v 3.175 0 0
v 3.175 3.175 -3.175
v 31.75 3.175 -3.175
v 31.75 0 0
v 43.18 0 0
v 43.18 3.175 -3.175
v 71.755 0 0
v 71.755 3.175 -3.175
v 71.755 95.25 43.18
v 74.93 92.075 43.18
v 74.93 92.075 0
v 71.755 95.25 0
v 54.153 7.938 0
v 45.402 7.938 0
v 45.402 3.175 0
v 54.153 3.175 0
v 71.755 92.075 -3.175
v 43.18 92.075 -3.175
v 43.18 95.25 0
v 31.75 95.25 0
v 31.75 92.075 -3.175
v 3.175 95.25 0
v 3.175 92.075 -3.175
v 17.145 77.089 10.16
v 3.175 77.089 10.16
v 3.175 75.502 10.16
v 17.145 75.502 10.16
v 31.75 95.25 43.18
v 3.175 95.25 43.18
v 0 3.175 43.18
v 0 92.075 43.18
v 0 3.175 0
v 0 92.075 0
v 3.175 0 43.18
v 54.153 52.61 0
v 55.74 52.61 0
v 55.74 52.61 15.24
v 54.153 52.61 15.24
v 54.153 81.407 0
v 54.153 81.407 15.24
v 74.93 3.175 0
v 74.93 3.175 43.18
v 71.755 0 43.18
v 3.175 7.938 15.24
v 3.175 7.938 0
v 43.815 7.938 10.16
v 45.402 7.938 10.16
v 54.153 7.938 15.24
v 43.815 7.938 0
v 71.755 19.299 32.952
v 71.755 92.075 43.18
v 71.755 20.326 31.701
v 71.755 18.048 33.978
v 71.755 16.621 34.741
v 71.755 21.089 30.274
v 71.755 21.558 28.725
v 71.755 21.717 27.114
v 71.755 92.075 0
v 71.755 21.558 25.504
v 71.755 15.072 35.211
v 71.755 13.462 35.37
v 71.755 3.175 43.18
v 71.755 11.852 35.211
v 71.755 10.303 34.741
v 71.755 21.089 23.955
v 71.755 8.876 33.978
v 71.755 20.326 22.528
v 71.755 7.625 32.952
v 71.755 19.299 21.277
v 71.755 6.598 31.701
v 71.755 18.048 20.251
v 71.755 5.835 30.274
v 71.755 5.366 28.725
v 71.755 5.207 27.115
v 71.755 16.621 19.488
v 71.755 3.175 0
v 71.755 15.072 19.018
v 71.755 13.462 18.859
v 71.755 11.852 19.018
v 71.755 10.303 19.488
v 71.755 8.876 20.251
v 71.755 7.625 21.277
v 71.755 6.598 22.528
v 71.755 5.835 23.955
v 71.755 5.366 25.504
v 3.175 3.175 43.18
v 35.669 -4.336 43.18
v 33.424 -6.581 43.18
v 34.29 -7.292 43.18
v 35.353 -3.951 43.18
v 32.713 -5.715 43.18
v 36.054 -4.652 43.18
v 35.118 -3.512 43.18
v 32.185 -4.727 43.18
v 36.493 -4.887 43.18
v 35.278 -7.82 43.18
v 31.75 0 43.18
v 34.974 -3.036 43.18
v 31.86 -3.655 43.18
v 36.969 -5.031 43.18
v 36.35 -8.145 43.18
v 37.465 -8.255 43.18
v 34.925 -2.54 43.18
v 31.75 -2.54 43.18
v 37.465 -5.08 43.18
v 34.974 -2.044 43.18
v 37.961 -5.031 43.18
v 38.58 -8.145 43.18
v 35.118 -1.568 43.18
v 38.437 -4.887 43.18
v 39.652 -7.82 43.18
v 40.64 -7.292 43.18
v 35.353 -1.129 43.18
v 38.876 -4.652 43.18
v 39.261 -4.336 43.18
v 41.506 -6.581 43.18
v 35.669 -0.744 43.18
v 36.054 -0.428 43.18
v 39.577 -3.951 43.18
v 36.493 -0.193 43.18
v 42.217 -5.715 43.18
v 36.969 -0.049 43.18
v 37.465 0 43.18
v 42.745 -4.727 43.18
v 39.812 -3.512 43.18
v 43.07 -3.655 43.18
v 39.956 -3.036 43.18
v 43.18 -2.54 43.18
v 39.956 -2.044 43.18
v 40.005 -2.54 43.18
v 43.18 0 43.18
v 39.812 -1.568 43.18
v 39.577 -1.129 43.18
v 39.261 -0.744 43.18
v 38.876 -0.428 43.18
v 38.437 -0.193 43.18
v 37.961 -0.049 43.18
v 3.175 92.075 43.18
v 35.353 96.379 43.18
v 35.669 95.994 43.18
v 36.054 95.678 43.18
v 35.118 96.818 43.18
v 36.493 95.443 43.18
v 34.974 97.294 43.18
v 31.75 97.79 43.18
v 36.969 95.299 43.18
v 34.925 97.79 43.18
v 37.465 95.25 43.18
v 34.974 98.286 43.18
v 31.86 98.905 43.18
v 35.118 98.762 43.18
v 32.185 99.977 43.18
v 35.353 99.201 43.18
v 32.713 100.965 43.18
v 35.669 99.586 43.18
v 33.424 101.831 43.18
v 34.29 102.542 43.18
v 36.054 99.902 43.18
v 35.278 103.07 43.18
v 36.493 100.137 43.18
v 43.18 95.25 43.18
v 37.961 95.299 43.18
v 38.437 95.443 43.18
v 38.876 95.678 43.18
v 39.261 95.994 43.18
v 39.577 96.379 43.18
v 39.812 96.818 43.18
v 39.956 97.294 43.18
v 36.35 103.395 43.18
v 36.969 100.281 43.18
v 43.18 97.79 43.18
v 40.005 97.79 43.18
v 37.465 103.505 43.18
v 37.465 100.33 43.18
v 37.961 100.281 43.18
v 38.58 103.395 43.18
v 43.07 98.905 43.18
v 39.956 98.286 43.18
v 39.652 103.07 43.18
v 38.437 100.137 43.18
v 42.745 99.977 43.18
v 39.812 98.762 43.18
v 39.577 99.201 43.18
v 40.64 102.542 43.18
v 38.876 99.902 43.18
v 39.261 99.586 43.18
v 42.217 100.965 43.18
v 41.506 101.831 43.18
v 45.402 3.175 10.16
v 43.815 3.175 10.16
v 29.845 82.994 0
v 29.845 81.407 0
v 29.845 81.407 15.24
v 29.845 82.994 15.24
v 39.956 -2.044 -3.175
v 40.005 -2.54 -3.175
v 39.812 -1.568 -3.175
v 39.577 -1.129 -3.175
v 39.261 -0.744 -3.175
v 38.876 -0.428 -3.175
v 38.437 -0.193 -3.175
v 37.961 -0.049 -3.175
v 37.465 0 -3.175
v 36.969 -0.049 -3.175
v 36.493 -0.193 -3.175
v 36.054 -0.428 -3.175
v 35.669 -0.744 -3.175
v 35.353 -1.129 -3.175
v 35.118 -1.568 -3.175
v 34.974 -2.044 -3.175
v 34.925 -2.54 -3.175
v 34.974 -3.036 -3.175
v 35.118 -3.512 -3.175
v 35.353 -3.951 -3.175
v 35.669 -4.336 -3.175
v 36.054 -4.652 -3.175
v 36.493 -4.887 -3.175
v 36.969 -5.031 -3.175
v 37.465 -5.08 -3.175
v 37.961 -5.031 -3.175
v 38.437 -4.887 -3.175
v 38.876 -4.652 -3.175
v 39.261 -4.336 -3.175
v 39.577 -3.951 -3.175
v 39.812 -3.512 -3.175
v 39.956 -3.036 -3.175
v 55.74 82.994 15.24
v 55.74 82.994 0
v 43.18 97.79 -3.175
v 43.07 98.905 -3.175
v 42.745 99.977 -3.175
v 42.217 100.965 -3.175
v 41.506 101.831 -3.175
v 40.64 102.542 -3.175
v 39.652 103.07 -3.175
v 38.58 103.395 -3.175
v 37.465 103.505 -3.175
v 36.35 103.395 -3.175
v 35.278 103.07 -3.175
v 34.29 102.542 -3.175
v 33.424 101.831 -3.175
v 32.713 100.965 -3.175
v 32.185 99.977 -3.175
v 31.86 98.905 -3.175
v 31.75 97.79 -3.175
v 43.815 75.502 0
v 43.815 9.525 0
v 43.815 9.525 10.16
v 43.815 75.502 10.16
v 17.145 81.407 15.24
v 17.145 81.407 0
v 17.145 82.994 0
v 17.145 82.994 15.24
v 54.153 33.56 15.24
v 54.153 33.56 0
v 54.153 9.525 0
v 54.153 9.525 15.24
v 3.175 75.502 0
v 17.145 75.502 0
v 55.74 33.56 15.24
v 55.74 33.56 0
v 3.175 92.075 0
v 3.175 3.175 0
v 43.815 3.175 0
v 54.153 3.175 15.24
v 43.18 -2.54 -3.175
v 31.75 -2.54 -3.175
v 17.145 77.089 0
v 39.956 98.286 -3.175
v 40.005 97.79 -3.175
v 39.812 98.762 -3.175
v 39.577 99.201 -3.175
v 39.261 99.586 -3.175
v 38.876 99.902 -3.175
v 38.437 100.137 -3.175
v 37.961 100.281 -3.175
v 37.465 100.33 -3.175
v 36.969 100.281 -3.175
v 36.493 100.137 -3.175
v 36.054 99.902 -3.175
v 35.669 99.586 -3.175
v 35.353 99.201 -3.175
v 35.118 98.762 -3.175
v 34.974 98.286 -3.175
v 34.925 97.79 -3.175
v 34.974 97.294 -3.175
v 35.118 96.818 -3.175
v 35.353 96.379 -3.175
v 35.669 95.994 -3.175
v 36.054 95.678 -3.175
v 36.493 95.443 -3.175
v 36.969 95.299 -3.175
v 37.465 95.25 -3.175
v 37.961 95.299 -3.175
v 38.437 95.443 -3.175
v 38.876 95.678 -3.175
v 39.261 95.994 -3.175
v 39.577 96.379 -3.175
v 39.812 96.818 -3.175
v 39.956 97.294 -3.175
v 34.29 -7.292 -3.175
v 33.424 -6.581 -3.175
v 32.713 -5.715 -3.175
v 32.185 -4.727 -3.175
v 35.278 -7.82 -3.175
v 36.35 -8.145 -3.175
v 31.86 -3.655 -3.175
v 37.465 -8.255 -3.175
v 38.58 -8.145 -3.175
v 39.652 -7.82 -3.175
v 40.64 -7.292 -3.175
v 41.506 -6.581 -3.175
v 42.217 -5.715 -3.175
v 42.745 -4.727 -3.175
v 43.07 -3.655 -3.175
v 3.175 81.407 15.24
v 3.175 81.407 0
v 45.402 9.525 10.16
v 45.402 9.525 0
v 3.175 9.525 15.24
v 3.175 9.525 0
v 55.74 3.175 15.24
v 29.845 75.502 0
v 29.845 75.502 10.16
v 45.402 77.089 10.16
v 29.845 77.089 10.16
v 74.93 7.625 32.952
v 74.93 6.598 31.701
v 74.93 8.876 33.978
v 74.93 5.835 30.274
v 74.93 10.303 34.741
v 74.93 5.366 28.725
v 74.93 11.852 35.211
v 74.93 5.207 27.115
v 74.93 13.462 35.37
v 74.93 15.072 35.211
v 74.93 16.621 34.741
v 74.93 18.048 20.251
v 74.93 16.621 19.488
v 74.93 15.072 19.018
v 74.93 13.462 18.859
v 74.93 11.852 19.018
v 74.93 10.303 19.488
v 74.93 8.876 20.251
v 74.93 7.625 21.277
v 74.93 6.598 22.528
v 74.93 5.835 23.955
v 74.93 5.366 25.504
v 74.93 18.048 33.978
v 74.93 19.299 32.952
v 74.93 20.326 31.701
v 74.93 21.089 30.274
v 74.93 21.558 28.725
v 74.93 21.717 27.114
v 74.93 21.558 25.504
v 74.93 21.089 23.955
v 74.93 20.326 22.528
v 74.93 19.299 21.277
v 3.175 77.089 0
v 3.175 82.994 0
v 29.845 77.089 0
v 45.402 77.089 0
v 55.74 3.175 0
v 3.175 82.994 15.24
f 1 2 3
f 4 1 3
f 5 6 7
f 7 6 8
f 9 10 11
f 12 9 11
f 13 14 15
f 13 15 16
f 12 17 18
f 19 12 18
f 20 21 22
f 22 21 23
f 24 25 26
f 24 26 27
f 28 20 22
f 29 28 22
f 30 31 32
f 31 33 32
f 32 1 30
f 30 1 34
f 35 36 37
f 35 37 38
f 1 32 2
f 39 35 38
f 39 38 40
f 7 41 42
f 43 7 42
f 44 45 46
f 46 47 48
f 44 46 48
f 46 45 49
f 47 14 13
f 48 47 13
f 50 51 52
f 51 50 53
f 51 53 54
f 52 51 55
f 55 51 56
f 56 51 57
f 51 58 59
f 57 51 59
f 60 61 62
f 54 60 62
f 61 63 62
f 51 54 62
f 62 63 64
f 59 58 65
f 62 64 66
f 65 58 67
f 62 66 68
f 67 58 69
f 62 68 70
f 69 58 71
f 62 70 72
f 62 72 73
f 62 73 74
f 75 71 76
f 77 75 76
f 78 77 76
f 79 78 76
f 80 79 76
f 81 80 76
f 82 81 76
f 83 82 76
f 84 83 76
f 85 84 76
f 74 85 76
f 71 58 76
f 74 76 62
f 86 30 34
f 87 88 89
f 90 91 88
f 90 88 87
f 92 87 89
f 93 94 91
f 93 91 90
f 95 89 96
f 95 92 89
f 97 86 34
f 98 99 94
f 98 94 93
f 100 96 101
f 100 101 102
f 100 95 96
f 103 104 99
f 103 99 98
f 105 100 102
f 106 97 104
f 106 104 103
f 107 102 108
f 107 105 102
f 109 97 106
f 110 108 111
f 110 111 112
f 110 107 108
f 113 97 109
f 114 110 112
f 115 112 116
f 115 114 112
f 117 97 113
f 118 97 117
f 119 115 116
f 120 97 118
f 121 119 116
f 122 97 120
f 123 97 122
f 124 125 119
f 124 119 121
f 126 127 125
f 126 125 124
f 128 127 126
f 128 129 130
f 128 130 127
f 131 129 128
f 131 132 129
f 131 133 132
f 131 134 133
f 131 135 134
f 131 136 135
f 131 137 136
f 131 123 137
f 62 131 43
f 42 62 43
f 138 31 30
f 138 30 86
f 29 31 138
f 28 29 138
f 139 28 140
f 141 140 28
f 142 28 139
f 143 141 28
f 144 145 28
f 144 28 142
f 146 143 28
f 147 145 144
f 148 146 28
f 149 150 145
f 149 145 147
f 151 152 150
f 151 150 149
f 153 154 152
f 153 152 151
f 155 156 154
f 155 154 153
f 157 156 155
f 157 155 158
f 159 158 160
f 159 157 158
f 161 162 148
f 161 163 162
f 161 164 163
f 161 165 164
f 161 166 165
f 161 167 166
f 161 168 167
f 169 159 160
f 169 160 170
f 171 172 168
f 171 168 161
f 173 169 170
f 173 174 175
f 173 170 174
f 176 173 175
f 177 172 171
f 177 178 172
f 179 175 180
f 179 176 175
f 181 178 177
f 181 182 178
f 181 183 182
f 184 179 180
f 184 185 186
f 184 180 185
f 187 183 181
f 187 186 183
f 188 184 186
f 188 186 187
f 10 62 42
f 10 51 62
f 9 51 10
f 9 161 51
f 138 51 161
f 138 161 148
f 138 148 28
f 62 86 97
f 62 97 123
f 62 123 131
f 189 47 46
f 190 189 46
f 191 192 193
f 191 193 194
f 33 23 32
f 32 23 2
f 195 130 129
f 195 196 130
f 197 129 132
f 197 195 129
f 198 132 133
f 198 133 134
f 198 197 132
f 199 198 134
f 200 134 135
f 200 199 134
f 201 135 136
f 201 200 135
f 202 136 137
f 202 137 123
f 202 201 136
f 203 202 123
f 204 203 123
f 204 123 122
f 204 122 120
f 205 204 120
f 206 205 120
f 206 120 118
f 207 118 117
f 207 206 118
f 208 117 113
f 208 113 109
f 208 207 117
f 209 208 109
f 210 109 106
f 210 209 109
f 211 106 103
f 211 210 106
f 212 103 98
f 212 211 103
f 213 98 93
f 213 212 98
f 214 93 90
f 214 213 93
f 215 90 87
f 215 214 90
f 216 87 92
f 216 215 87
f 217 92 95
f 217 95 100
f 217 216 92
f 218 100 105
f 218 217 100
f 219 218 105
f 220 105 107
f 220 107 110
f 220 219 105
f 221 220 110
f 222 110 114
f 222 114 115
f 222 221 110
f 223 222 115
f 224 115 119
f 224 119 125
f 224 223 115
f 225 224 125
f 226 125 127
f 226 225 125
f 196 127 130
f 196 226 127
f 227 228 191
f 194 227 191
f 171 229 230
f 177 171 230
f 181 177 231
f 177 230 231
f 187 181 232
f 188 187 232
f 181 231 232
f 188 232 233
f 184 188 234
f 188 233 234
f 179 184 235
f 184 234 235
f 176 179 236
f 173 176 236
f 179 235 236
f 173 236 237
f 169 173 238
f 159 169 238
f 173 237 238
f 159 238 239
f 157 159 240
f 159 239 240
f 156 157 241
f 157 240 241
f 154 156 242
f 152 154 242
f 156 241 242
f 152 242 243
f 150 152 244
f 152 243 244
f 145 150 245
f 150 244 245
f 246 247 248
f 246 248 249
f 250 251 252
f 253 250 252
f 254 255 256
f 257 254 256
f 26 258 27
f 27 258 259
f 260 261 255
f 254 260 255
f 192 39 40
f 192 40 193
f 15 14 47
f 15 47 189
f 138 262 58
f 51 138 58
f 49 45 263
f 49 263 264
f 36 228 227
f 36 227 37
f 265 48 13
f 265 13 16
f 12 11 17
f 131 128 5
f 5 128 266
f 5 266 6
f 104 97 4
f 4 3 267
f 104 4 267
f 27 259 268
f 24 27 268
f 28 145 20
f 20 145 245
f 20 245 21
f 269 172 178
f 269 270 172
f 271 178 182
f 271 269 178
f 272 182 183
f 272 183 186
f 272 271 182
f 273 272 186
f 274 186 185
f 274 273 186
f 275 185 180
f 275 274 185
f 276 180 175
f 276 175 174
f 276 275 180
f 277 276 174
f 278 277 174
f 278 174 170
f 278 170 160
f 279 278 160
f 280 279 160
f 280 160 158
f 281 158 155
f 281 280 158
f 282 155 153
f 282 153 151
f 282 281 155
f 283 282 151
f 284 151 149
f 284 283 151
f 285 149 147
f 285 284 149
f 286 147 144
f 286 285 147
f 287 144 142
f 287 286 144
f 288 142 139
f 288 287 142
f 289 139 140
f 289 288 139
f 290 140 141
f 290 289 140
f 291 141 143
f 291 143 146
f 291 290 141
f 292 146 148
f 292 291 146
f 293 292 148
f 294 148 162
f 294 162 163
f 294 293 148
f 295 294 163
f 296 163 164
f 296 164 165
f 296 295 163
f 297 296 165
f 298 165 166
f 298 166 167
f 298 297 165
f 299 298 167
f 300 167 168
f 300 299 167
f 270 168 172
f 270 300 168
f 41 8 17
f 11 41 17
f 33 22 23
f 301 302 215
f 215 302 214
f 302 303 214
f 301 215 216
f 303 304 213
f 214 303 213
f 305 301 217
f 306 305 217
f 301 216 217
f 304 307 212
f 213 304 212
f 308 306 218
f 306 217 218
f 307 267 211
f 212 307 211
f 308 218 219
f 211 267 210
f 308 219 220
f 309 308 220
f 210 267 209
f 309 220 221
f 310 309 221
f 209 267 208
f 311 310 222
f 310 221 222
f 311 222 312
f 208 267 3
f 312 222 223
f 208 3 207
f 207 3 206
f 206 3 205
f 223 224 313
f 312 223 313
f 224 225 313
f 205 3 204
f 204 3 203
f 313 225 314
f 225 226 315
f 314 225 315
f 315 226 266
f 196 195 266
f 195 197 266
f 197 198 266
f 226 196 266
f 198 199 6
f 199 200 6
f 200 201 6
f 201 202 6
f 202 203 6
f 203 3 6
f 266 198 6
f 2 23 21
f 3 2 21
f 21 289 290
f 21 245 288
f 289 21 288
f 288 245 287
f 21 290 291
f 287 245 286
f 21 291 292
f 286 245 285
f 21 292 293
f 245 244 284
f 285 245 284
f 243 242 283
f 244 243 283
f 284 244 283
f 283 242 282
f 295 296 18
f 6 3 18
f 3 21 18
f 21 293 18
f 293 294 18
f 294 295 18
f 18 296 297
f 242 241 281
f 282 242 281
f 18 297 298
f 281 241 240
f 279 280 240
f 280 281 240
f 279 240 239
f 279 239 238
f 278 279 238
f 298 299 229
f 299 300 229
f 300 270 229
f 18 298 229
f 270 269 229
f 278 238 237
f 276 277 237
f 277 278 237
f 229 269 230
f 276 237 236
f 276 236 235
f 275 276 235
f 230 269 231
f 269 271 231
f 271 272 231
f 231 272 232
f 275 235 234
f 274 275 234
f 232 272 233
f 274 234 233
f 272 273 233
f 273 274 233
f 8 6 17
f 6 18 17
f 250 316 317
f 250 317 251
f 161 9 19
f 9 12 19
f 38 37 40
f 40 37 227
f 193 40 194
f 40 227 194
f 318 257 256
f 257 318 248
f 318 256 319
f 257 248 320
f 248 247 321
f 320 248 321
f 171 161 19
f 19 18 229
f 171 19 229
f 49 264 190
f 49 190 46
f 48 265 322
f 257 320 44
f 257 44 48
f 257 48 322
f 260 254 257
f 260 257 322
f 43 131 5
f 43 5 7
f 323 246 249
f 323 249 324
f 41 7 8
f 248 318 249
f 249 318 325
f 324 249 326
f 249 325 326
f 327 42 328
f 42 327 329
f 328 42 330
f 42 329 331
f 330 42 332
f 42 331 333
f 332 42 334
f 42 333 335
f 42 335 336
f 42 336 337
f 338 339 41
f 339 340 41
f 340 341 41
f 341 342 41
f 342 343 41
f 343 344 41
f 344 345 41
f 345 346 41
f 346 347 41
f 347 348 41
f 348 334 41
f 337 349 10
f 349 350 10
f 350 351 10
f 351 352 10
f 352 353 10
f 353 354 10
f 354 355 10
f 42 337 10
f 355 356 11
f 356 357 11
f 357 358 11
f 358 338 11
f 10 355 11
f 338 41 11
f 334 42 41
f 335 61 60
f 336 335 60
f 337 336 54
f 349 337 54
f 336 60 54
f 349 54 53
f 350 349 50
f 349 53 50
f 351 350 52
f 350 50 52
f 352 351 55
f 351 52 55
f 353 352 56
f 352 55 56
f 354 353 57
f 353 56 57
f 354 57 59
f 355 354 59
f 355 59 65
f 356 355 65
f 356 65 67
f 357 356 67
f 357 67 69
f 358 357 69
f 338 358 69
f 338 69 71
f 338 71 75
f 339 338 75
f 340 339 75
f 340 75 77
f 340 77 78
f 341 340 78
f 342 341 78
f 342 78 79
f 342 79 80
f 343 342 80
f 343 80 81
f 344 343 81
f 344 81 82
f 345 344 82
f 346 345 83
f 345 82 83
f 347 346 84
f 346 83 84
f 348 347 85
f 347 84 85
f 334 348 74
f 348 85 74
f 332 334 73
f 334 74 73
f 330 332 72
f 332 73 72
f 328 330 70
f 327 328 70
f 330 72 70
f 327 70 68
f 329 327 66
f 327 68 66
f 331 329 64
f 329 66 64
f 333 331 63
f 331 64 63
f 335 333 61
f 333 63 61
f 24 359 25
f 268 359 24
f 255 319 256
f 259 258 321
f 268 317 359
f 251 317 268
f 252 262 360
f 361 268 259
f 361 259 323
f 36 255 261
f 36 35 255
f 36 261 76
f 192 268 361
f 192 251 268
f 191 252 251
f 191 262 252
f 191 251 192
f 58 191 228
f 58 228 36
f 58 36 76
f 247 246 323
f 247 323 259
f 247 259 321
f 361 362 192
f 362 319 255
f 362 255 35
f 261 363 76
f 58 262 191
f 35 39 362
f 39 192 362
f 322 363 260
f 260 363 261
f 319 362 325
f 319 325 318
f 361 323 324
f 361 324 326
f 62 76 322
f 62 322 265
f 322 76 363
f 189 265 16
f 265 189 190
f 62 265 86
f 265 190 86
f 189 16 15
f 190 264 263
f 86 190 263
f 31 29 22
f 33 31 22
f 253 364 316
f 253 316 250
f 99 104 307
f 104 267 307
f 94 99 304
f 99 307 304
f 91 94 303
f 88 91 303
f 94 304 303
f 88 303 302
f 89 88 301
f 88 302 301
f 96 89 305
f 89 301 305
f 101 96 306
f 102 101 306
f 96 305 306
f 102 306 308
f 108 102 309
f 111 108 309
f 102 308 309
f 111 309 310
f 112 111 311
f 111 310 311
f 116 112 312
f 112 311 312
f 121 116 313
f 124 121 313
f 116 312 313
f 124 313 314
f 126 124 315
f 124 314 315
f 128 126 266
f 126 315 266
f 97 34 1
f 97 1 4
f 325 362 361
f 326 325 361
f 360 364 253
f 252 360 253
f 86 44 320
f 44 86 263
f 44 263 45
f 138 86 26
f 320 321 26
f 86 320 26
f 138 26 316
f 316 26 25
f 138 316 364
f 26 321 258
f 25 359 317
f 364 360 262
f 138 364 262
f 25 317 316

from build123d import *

# Parameters (mm, degrees)
SKETCH1_R           = 2.54
BOSS_EXTRUDE1_DEPTH = 3.175
SKETCH1_3_W         = 13.97
SKETCH1_3_H         = 1.5875
BOSS_EXTRUDE2_DEPTH = 10.16
BOSS_EXTRUDE3_START = 43.18
SKETCH1_4_R         = 2.54
BOSS_EXTRUDE3_DEPTH = 43.18
SKETCH2_W           = 13.97
SKETCH2_H           = 1.5875
BOSS_EXTRUDE4_DEPTH = 15.24
SKETCH3_R           = 8.255
CUT_EXTRUDE1_DEPTH  = 15.24
CHAMFER1_SIZE       = 3.175


with BuildPart() as part:
    # Sketch1 → Boss-Extrude1 (new body)
    with BuildSketch(Plane.XY):
        with BuildLine():
            Line((0, 0), (31.75, 0))
            Line((31.75, 0), (31.75, -2.54))
            ThreePointArc((31.75, -2.54), (37.465, -8.255), (43.18, -2.54))
            Line((43.18, -2.54), (43.18, 0))
            Line((43.18, 0), (74.93, 0))
            Line((74.93, 0), (74.93, 95.25))
            Line((74.93, 95.25), (43.18, 95.25))
            Line((43.18, 95.25), (43.18, 97.79))
            ThreePointArc((43.18, 97.79), (37.465, 103.505), (31.75, 97.79))
            Line((31.75, 97.79), (31.75, 95.25))
            Line((31.75, 95.25), (0, 95.25))
            Line((0, 95.25), (0, 0))
        make_face()
        with Locations((37.465, -2.54)):
            Circle(SKETCH1_R, mode=Mode.SUBTRACT)
        with Locations((37.465, 97.79)):
            Circle(SKETCH1_R, mode=Mode.SUBTRACT)
    extrude(amount=-BOSS_EXTRUDE1_DEPTH)

    # Sketch1<3> → Boss-Extrude2 (add)
    with BuildSketch(Plane.XY):
        Polygon((43.815, 9.525), (43.815, 75.5015), (29.845, 75.5015), (29.845, 77.089), (43.815, 77.089), (45.4025, 77.089), (45.4025, 3.175), (43.815, 3.175), (43.815, 7.9375), (3.175, 7.9375), (3.175, 9.525), align=None)
        with Locations((10.16, 76.29525)):
            Rectangle(SKETCH1_3_W, SKETCH1_3_H)
    extrude(amount=BOSS_EXTRUDE2_DEPTH)

    # Sketch1<4> → Boss-Extrude3 (add)
    with BuildSketch(Plane.XY.offset(BOSS_EXTRUDE3_START)):
        with BuildLine():
            Line((0, 95.25), (0, 0))
            Line((0, 0), (31.75, 0))
            Line((31.75, 0), (31.75, -2.54))
            ThreePointArc((31.75, -2.54), (37.465, -8.255), (43.18, -2.54))
            Line((43.18, -2.54), (43.18, 0))
            Line((43.18, 0), (74.93, 0))
            Line((74.93, 0), (74.93, 95.25))
            Line((74.93, 95.25), (43.18, 95.25))
            Line((43.18, 95.25), (43.18, 97.79))
            ThreePointArc((43.18, 97.79), (37.465, 103.505), (31.75, 97.79))
            Line((31.75, 97.79), (31.75, 95.25))
            Line((31.75, 95.25), (0, 95.25))
        make_face()
        with Locations((37.465, -2.54)):
            Circle(SKETCH1_4_R, mode=Mode.SUBTRACT)
        Polygon((3.175, 7.9375), (3.175, 9.525), (3.175, 75.5015), (3.175, 77.089), (3.175, 92.075), (71.755, 92.075), (71.755, 3.175), (45.4025, 3.175), (43.815, 3.175), (3.175, 3.175), align=None, mode=Mode.SUBTRACT)
        with Locations((37.465, 97.79)):
            Circle(SKETCH1_4_R, mode=Mode.SUBTRACT)
    extrude(amount=-BOSS_EXTRUDE3_DEPTH)

    # Sketch2 → Boss-Extrude4 (add)
    with BuildSketch(Plane.XY):
        with Locations((10.16, 82.20075)):
            Rectangle(SKETCH2_W, SKETCH2_H)
        Polygon((54.737, 82.9945), (55.740027204, 82.9945), (55.740027204, 52.60975), (54.152527204, 52.60975), (54.152527204, 81.407), (29.845, 81.407), (29.845, 82.9945), align=None)
        Polygon((54.152527204, 3.175), (55.740027204, 3.175), (55.740027204, 33.55975), (54.152527204, 33.55975), (54.152527204, 9.525), (3.175, 9.525), (3.175, 7.9375), (54.152527204, 7.9375), align=None)
    extrude(amount=BOSS_EXTRUDE4_DEPTH)

    # Sketch3 → Cut-Extrude1 (cut)
    with BuildSketch(Plane.ZY.offset(-71.755)):
        with Locations((27.1145, 13.462)):
            Circle(SKETCH3_R)
    extrude(amount=-CUT_EXTRUDE1_DEPTH, mode=Mode.SUBTRACT)

    # Chamfer1
    chamfer1_edges = [part.edges().sort_by_distance(p)[0] for p in [
        (74.93, 0, 20.0025),
        (74.93, 95.25, 20.0025),
        (59.055, 95.25, -3.175),
        (74.93, 47.625, -3.175),
        (59.055, 0, -3.175),
        (0, 0, 20.0025),
        (0, 95.25, 20.0025),
        (15.875, 95.25, -3.175),
        (15.875, 0, -3.175),
        (0, 47.625, -3.175),
    ]]
    chamfer(chamfer1_edges, length=CHAMFER1_SIZE)


solid = part.part
